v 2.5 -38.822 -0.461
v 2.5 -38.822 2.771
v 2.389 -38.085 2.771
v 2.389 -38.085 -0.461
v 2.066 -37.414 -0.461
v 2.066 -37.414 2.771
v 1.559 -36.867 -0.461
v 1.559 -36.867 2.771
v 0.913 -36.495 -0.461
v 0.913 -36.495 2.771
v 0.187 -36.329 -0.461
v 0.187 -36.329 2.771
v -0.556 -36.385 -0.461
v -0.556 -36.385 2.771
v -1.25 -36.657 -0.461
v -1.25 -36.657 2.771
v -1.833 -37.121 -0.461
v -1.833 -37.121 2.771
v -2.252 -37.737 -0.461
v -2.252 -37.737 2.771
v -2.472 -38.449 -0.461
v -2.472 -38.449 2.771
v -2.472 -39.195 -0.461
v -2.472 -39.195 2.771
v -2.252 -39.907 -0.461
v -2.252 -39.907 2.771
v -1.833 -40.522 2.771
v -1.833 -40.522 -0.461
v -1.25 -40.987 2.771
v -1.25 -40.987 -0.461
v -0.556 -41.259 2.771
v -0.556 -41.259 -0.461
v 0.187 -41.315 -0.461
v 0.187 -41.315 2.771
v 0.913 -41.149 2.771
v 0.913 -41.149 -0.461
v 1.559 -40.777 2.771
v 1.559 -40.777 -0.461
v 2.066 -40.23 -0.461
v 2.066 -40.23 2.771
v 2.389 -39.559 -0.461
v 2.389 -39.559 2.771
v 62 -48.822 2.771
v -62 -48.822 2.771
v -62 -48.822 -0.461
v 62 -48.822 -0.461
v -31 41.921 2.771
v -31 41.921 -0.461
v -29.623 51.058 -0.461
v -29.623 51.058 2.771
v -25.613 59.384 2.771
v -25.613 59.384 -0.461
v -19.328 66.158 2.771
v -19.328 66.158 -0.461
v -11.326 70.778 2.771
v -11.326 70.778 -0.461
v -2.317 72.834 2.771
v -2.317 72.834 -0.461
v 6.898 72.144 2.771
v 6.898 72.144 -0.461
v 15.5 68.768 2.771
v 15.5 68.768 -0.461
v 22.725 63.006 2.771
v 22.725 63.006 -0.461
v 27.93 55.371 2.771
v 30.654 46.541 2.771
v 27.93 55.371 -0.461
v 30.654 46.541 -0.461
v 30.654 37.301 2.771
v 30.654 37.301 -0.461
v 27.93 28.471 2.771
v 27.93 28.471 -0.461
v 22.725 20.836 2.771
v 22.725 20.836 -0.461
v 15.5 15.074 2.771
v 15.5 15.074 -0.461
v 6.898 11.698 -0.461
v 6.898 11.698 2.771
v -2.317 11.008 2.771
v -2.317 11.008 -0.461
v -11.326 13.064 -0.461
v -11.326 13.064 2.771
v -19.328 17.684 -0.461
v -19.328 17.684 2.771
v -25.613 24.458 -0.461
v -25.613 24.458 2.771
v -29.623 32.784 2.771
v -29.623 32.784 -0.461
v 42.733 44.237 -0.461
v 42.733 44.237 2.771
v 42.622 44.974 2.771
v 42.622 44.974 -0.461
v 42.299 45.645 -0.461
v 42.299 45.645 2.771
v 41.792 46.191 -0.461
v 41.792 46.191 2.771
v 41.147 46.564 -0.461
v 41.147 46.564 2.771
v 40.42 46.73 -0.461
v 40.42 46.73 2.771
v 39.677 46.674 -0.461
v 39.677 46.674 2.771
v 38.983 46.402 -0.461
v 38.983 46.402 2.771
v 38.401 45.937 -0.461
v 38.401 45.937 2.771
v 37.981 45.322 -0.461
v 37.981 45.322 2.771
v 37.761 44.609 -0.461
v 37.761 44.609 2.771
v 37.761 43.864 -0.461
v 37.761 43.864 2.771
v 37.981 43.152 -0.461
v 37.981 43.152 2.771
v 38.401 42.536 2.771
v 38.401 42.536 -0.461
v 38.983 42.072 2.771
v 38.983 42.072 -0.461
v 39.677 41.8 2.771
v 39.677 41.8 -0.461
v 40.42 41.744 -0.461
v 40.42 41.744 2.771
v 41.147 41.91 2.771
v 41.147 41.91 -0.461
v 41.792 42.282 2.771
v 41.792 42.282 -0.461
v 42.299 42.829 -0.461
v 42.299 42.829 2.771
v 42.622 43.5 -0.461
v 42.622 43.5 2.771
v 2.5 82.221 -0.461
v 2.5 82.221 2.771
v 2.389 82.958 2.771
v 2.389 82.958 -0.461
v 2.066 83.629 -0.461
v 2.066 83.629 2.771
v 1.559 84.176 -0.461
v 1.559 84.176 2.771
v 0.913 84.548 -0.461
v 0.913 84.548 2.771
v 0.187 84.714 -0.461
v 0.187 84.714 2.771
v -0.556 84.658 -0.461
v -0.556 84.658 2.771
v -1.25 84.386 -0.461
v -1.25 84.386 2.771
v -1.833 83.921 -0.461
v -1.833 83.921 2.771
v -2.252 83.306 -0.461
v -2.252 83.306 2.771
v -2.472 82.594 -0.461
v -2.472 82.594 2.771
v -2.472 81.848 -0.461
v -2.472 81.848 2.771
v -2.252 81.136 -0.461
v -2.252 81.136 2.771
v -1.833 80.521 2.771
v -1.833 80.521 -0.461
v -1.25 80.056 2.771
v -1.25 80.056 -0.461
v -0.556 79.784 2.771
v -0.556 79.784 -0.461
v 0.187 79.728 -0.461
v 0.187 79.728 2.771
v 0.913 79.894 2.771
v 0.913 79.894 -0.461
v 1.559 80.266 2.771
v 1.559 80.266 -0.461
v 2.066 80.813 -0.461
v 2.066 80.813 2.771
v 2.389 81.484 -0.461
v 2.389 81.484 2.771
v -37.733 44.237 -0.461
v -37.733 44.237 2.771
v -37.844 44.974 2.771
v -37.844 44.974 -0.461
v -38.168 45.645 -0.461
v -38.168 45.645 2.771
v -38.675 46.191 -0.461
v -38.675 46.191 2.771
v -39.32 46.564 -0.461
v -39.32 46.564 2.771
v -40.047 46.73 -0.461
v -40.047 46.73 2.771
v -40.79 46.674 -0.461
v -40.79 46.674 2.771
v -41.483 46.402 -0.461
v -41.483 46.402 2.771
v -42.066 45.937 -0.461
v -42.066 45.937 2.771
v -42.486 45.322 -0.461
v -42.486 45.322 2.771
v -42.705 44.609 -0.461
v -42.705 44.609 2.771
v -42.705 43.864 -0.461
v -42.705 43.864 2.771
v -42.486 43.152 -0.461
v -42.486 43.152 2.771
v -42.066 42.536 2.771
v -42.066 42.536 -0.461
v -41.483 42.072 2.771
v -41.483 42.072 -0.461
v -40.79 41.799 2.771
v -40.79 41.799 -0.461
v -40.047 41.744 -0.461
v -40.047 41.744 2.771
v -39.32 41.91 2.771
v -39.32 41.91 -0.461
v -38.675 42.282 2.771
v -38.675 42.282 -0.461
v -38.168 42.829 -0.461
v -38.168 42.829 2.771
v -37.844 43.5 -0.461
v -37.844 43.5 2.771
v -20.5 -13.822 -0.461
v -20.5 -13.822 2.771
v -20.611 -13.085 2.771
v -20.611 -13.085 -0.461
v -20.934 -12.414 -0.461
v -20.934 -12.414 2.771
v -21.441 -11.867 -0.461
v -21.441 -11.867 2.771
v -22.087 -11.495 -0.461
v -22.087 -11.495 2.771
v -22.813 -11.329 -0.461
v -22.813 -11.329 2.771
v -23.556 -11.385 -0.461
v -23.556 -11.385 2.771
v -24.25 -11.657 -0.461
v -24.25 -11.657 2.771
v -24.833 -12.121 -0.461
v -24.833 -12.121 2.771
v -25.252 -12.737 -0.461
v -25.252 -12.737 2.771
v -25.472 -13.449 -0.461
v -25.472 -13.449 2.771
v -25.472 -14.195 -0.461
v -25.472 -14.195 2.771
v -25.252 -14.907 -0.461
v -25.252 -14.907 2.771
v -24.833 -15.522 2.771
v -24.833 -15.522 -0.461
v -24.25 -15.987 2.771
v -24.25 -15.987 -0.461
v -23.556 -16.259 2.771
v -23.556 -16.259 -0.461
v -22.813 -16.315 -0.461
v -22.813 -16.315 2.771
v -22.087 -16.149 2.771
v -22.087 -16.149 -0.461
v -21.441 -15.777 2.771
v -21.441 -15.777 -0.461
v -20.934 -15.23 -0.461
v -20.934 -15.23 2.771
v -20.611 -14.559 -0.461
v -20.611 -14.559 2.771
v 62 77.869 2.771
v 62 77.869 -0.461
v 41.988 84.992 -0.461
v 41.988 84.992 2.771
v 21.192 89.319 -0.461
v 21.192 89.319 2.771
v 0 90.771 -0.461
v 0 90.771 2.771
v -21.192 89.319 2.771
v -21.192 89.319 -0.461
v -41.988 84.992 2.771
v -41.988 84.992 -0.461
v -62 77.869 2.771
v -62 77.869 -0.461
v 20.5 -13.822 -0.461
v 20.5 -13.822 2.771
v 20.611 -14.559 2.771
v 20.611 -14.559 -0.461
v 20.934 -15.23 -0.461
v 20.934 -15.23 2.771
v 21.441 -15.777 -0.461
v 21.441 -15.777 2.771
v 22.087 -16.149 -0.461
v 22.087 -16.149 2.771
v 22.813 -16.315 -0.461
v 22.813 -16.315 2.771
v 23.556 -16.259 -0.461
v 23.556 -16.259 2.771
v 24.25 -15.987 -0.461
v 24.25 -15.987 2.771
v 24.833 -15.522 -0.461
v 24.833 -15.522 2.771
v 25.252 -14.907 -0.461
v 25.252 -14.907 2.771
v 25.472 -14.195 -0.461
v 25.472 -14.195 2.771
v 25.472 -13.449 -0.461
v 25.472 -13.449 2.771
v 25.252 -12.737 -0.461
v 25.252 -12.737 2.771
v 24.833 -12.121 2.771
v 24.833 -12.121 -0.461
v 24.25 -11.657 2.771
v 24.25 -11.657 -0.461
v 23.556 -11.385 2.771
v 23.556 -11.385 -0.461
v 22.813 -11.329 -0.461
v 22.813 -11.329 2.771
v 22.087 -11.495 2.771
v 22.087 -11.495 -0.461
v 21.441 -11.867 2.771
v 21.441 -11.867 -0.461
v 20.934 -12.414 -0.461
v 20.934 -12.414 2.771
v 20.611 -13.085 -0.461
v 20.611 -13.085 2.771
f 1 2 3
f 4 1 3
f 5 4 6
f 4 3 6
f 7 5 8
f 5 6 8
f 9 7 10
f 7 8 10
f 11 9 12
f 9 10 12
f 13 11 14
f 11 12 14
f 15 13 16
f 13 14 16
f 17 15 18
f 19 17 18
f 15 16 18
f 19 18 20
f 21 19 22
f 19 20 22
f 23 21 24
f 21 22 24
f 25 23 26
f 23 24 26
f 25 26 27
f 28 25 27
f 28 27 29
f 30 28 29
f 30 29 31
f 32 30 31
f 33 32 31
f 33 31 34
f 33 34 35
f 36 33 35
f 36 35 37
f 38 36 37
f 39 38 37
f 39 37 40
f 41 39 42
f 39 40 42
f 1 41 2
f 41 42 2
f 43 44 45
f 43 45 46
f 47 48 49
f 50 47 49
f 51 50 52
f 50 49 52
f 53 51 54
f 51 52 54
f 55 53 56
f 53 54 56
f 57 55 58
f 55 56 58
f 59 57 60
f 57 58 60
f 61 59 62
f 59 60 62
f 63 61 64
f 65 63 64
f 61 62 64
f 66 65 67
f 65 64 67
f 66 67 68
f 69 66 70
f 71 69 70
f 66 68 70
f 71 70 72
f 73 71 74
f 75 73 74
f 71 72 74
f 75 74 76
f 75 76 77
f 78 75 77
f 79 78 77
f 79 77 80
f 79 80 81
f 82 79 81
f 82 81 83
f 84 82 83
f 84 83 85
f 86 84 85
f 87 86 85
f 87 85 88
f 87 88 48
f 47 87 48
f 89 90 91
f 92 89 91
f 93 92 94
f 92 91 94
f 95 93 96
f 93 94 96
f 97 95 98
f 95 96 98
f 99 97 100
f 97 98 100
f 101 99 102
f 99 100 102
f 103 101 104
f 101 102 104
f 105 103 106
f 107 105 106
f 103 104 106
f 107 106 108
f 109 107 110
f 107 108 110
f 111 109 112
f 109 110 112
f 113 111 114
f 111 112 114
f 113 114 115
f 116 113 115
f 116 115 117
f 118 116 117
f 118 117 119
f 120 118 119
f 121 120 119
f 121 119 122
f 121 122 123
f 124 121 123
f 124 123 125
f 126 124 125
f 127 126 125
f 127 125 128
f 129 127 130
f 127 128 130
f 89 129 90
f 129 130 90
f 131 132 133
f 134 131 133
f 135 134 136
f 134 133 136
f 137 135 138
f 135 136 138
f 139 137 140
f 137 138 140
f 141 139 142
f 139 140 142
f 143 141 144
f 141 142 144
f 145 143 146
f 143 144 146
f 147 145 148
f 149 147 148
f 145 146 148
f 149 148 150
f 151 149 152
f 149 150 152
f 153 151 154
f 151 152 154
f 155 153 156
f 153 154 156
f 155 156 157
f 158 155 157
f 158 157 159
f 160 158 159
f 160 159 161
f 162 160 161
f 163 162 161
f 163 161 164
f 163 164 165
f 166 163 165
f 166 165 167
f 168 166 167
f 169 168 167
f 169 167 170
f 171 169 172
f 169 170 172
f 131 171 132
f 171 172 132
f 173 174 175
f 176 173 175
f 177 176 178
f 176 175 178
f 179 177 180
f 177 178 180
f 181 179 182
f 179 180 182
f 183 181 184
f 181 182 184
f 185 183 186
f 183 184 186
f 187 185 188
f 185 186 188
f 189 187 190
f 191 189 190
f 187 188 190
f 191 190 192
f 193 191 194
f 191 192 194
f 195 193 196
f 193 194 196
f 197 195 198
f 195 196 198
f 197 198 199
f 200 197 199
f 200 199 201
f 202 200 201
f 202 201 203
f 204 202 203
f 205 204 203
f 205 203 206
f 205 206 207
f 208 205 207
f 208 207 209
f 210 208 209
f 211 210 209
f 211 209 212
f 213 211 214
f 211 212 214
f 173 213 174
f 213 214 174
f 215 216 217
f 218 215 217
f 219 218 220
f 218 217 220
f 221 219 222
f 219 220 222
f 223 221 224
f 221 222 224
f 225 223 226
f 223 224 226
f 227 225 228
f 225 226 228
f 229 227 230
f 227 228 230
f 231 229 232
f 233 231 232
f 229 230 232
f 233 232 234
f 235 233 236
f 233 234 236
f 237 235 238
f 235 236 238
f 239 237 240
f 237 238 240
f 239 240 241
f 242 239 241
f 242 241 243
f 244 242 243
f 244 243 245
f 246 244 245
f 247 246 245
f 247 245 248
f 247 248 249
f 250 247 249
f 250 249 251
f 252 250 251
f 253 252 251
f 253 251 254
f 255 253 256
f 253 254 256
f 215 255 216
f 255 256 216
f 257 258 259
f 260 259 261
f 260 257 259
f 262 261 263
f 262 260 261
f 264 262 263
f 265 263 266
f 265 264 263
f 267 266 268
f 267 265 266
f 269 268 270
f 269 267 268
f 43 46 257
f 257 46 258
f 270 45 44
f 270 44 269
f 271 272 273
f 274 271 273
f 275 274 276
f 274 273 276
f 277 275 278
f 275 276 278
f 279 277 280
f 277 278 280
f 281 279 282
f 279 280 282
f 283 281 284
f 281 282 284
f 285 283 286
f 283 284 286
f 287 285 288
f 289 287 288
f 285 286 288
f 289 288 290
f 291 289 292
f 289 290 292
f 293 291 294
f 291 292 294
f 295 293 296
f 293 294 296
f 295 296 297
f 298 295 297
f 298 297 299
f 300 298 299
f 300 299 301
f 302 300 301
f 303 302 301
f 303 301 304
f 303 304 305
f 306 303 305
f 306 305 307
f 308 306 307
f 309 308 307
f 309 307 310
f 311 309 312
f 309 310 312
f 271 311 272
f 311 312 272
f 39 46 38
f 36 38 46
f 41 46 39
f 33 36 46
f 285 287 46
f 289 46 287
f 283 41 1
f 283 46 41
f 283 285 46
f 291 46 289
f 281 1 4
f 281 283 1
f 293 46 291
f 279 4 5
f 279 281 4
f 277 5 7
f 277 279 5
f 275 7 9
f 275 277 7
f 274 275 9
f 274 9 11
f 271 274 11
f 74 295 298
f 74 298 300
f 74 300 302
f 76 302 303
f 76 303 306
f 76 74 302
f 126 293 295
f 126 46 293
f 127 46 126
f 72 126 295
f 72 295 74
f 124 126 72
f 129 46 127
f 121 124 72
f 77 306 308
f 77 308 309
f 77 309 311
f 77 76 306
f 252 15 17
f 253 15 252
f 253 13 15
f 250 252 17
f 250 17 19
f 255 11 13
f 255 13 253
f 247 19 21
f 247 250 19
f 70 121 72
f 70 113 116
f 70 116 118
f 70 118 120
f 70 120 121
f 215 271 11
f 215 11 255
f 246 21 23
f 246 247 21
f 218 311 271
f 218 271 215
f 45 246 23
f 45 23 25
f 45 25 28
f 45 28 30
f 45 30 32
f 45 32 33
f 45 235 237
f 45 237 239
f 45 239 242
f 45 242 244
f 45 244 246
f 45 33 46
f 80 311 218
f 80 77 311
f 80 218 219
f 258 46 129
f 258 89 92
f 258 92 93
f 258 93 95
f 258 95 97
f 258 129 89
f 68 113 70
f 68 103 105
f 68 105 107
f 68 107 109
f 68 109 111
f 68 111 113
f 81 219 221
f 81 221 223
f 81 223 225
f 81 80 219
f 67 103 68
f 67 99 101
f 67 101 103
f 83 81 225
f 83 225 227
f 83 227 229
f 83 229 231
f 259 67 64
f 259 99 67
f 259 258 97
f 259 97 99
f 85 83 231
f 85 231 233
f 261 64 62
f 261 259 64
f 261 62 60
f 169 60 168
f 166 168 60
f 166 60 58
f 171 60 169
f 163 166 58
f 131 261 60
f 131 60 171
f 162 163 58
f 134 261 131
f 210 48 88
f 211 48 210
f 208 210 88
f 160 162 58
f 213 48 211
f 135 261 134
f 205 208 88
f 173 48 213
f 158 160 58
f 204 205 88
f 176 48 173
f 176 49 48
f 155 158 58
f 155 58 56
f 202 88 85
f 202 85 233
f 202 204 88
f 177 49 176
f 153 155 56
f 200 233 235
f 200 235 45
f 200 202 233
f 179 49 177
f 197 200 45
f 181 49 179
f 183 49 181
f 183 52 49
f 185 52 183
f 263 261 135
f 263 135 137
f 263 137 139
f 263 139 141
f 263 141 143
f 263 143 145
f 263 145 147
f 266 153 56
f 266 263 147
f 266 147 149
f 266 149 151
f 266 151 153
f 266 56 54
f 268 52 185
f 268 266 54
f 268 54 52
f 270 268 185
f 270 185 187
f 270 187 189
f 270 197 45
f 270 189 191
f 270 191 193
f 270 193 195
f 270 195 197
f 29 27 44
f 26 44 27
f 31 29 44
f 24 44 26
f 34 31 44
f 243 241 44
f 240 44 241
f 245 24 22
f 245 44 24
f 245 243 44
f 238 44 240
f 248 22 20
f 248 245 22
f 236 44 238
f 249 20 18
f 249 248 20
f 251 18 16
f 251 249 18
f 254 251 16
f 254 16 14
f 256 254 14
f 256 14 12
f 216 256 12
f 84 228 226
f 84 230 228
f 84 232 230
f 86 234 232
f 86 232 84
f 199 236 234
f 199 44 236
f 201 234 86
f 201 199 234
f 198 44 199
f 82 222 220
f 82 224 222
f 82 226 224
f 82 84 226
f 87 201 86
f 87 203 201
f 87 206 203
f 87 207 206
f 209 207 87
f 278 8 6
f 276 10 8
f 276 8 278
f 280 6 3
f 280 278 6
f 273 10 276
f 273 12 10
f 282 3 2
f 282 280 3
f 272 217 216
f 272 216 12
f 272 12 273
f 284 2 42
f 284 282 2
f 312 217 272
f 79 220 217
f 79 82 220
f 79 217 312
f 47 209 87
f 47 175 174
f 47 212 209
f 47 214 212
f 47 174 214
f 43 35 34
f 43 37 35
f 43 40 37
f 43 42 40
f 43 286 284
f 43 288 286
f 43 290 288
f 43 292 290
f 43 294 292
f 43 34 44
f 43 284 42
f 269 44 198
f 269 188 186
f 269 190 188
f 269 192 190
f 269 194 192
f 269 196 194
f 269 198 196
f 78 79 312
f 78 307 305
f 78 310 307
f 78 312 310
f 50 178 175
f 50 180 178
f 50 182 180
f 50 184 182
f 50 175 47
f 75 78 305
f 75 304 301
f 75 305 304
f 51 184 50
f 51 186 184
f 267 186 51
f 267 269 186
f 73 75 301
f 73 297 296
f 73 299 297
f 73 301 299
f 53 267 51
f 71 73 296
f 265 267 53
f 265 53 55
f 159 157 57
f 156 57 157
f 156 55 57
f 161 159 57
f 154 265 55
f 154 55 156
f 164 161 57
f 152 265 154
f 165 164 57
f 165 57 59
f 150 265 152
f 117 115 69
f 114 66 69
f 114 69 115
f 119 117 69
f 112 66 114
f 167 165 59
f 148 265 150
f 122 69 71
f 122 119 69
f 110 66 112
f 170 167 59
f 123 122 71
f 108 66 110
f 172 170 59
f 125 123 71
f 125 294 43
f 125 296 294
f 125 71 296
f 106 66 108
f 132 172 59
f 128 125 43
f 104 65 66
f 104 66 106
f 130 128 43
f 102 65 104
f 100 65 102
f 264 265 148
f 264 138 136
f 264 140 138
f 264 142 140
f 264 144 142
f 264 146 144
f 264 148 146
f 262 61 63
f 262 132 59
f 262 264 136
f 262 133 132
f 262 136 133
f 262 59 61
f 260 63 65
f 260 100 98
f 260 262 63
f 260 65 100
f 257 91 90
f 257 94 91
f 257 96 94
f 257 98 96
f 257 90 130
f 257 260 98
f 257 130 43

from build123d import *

# Parameters (mm, degrees)
SKETCH1_W           = 70
SKETCH1_H           = 105
BOSS_EXTRUDE1_DEPTH = 2
SKETCH2_R           = 17.5
CUT_EXTRUDE3_DEPTH  = 3
CUT_EXTRUDE6_DEPTH  = 10
SCALE1_SCALE        = 1.771428571
SKETCH6_R           = 30.999999993
CUT_EXTRUDE7_DEPTH  = 0.31
SKETCH7_W           = 123.99999997
SKETCH7_H           = 38.57142855
CUT_EXTRUDE8_DEPTH  = 10
SKETCH9_R           = 2.5
CUT_EXTRUDE9_DEPTH  = 3.232857142
SKETCH10_R          = 2.5
CUT_EXTRUDE10_DEPTH = 3.232857142


with BuildPart() as part:
    # Sketch1 → Boss-Extrude1 (new body)
    with BuildSketch(Plane.XY):
        Rectangle(SKETCH1_W, SKETCH1_H)
    extrude(amount=BOSS_EXTRUDE1_DEPTH)

    # Sketch2 → Cut-Extrude3 (cut)
    with BuildSketch(Plane(origin=(0, 0, 0), x_dir=(-1, 0, 0), z_dir=(0, 0, -1))):
        with Locations((0, 20.5)):
            Circle(SKETCH2_R)
    extrude(amount=-CUT_EXTRUDE3_DEPTH, mode=Mode.SUBTRACT)

    # Sketch5 → Cut-Extrude6 (cut)
    with BuildSketch(Plane.XY.offset(2)):
        with BuildLine():
            Line((-35, 40.793543502), (-35, 52.5))
            Line((-35, 52.5), (35, 52.5))
            Line((35, 52.5), (35, 40.793543502))
            ThreePointArc((35, 40.793543502), (0, 48.07644174), (-35, 40.793543502))
        make_face()
    extrude(amount=-CUT_EXTRUDE6_DEPTH, mode=Mode.SUBTRACT)


with BuildPart() as part_1:
    # Scale1: scaled about (0, -7.267874882, 1)
    add(part.part.scale(SCALE1_SCALE).moved(Location((0, 5.606646334, -0.771428571))))

    # Sketch6 → Cut-Extrude7 (cut)
    with BuildSketch(Plane(origin=(0, 0, -0.771428571), x_dir=(-1, 0, 0), z_dir=(0, 0, -1))):
        with BuildLine():
            Line((61.999999985, -87.393353643), (61.999999985, 77.869494806))
            ThreePointArc((61.999999985, 77.869494806), (0, 90.770628825), (-61.999999985, 77.869494806))
            Line((-61.999999985, 77.869494806), (-61.999999985, -87.393353643))
            Line((-61.999999985, -87.393353643), (61.999999985, -87.393353643))
        make_face()
        with Locations((0, 41.92093204)):
            Circle(SKETCH6_R, mode=Mode.SUBTRACT)
    extrude(amount=-CUT_EXTRUDE7_DEPTH, mode=Mode.SUBTRACT)

    # Sketch7 → Cut-Extrude8 (cut)
    with BuildSketch(Plane.XY.offset(2.771428571)):
        with Locations((0, -68.107639368)):
            Rectangle(SKETCH7_W, SKETCH7_H)
    extrude(amount=-CUT_EXTRUDE8_DEPTH, mode=Mode.SUBTRACT)

    # Sketch9 → Cut-Extrude9 (cut)
    with BuildSketch(Plane.XY.offset(2.771428571)):
        with Locations((0, -38.821925093)):
            Circle(SKETCH9_R)
        with Locations((-23, -13.821925093)):
            Circle(SKETCH9_R)
        with Locations(Location((23, -13.821925093, 0), (0, 0, 180))):
            Circle(SKETCH9_R)
    extrude(amount=-CUT_EXTRUDE9_DEPTH, mode=Mode.SUBTRACT)

    # Sketch10 → Cut-Extrude10 (cut)
    with BuildSketch(Plane.XY.offset(2.771428571)):
        with Locations((-40.233402491, 44.236817184)):
            Circle(SKETCH10_R)
        with Locations((0, 82.22093204)):
            Circle(SKETCH10_R)
        with Locations((40.233400771, 44.236847056)):
            Circle(SKETCH10_R)
    extrude(amount=-CUT_EXTRUDE10_DEPTH, mode=Mode.SUBTRACT)


solid = part_1.part
